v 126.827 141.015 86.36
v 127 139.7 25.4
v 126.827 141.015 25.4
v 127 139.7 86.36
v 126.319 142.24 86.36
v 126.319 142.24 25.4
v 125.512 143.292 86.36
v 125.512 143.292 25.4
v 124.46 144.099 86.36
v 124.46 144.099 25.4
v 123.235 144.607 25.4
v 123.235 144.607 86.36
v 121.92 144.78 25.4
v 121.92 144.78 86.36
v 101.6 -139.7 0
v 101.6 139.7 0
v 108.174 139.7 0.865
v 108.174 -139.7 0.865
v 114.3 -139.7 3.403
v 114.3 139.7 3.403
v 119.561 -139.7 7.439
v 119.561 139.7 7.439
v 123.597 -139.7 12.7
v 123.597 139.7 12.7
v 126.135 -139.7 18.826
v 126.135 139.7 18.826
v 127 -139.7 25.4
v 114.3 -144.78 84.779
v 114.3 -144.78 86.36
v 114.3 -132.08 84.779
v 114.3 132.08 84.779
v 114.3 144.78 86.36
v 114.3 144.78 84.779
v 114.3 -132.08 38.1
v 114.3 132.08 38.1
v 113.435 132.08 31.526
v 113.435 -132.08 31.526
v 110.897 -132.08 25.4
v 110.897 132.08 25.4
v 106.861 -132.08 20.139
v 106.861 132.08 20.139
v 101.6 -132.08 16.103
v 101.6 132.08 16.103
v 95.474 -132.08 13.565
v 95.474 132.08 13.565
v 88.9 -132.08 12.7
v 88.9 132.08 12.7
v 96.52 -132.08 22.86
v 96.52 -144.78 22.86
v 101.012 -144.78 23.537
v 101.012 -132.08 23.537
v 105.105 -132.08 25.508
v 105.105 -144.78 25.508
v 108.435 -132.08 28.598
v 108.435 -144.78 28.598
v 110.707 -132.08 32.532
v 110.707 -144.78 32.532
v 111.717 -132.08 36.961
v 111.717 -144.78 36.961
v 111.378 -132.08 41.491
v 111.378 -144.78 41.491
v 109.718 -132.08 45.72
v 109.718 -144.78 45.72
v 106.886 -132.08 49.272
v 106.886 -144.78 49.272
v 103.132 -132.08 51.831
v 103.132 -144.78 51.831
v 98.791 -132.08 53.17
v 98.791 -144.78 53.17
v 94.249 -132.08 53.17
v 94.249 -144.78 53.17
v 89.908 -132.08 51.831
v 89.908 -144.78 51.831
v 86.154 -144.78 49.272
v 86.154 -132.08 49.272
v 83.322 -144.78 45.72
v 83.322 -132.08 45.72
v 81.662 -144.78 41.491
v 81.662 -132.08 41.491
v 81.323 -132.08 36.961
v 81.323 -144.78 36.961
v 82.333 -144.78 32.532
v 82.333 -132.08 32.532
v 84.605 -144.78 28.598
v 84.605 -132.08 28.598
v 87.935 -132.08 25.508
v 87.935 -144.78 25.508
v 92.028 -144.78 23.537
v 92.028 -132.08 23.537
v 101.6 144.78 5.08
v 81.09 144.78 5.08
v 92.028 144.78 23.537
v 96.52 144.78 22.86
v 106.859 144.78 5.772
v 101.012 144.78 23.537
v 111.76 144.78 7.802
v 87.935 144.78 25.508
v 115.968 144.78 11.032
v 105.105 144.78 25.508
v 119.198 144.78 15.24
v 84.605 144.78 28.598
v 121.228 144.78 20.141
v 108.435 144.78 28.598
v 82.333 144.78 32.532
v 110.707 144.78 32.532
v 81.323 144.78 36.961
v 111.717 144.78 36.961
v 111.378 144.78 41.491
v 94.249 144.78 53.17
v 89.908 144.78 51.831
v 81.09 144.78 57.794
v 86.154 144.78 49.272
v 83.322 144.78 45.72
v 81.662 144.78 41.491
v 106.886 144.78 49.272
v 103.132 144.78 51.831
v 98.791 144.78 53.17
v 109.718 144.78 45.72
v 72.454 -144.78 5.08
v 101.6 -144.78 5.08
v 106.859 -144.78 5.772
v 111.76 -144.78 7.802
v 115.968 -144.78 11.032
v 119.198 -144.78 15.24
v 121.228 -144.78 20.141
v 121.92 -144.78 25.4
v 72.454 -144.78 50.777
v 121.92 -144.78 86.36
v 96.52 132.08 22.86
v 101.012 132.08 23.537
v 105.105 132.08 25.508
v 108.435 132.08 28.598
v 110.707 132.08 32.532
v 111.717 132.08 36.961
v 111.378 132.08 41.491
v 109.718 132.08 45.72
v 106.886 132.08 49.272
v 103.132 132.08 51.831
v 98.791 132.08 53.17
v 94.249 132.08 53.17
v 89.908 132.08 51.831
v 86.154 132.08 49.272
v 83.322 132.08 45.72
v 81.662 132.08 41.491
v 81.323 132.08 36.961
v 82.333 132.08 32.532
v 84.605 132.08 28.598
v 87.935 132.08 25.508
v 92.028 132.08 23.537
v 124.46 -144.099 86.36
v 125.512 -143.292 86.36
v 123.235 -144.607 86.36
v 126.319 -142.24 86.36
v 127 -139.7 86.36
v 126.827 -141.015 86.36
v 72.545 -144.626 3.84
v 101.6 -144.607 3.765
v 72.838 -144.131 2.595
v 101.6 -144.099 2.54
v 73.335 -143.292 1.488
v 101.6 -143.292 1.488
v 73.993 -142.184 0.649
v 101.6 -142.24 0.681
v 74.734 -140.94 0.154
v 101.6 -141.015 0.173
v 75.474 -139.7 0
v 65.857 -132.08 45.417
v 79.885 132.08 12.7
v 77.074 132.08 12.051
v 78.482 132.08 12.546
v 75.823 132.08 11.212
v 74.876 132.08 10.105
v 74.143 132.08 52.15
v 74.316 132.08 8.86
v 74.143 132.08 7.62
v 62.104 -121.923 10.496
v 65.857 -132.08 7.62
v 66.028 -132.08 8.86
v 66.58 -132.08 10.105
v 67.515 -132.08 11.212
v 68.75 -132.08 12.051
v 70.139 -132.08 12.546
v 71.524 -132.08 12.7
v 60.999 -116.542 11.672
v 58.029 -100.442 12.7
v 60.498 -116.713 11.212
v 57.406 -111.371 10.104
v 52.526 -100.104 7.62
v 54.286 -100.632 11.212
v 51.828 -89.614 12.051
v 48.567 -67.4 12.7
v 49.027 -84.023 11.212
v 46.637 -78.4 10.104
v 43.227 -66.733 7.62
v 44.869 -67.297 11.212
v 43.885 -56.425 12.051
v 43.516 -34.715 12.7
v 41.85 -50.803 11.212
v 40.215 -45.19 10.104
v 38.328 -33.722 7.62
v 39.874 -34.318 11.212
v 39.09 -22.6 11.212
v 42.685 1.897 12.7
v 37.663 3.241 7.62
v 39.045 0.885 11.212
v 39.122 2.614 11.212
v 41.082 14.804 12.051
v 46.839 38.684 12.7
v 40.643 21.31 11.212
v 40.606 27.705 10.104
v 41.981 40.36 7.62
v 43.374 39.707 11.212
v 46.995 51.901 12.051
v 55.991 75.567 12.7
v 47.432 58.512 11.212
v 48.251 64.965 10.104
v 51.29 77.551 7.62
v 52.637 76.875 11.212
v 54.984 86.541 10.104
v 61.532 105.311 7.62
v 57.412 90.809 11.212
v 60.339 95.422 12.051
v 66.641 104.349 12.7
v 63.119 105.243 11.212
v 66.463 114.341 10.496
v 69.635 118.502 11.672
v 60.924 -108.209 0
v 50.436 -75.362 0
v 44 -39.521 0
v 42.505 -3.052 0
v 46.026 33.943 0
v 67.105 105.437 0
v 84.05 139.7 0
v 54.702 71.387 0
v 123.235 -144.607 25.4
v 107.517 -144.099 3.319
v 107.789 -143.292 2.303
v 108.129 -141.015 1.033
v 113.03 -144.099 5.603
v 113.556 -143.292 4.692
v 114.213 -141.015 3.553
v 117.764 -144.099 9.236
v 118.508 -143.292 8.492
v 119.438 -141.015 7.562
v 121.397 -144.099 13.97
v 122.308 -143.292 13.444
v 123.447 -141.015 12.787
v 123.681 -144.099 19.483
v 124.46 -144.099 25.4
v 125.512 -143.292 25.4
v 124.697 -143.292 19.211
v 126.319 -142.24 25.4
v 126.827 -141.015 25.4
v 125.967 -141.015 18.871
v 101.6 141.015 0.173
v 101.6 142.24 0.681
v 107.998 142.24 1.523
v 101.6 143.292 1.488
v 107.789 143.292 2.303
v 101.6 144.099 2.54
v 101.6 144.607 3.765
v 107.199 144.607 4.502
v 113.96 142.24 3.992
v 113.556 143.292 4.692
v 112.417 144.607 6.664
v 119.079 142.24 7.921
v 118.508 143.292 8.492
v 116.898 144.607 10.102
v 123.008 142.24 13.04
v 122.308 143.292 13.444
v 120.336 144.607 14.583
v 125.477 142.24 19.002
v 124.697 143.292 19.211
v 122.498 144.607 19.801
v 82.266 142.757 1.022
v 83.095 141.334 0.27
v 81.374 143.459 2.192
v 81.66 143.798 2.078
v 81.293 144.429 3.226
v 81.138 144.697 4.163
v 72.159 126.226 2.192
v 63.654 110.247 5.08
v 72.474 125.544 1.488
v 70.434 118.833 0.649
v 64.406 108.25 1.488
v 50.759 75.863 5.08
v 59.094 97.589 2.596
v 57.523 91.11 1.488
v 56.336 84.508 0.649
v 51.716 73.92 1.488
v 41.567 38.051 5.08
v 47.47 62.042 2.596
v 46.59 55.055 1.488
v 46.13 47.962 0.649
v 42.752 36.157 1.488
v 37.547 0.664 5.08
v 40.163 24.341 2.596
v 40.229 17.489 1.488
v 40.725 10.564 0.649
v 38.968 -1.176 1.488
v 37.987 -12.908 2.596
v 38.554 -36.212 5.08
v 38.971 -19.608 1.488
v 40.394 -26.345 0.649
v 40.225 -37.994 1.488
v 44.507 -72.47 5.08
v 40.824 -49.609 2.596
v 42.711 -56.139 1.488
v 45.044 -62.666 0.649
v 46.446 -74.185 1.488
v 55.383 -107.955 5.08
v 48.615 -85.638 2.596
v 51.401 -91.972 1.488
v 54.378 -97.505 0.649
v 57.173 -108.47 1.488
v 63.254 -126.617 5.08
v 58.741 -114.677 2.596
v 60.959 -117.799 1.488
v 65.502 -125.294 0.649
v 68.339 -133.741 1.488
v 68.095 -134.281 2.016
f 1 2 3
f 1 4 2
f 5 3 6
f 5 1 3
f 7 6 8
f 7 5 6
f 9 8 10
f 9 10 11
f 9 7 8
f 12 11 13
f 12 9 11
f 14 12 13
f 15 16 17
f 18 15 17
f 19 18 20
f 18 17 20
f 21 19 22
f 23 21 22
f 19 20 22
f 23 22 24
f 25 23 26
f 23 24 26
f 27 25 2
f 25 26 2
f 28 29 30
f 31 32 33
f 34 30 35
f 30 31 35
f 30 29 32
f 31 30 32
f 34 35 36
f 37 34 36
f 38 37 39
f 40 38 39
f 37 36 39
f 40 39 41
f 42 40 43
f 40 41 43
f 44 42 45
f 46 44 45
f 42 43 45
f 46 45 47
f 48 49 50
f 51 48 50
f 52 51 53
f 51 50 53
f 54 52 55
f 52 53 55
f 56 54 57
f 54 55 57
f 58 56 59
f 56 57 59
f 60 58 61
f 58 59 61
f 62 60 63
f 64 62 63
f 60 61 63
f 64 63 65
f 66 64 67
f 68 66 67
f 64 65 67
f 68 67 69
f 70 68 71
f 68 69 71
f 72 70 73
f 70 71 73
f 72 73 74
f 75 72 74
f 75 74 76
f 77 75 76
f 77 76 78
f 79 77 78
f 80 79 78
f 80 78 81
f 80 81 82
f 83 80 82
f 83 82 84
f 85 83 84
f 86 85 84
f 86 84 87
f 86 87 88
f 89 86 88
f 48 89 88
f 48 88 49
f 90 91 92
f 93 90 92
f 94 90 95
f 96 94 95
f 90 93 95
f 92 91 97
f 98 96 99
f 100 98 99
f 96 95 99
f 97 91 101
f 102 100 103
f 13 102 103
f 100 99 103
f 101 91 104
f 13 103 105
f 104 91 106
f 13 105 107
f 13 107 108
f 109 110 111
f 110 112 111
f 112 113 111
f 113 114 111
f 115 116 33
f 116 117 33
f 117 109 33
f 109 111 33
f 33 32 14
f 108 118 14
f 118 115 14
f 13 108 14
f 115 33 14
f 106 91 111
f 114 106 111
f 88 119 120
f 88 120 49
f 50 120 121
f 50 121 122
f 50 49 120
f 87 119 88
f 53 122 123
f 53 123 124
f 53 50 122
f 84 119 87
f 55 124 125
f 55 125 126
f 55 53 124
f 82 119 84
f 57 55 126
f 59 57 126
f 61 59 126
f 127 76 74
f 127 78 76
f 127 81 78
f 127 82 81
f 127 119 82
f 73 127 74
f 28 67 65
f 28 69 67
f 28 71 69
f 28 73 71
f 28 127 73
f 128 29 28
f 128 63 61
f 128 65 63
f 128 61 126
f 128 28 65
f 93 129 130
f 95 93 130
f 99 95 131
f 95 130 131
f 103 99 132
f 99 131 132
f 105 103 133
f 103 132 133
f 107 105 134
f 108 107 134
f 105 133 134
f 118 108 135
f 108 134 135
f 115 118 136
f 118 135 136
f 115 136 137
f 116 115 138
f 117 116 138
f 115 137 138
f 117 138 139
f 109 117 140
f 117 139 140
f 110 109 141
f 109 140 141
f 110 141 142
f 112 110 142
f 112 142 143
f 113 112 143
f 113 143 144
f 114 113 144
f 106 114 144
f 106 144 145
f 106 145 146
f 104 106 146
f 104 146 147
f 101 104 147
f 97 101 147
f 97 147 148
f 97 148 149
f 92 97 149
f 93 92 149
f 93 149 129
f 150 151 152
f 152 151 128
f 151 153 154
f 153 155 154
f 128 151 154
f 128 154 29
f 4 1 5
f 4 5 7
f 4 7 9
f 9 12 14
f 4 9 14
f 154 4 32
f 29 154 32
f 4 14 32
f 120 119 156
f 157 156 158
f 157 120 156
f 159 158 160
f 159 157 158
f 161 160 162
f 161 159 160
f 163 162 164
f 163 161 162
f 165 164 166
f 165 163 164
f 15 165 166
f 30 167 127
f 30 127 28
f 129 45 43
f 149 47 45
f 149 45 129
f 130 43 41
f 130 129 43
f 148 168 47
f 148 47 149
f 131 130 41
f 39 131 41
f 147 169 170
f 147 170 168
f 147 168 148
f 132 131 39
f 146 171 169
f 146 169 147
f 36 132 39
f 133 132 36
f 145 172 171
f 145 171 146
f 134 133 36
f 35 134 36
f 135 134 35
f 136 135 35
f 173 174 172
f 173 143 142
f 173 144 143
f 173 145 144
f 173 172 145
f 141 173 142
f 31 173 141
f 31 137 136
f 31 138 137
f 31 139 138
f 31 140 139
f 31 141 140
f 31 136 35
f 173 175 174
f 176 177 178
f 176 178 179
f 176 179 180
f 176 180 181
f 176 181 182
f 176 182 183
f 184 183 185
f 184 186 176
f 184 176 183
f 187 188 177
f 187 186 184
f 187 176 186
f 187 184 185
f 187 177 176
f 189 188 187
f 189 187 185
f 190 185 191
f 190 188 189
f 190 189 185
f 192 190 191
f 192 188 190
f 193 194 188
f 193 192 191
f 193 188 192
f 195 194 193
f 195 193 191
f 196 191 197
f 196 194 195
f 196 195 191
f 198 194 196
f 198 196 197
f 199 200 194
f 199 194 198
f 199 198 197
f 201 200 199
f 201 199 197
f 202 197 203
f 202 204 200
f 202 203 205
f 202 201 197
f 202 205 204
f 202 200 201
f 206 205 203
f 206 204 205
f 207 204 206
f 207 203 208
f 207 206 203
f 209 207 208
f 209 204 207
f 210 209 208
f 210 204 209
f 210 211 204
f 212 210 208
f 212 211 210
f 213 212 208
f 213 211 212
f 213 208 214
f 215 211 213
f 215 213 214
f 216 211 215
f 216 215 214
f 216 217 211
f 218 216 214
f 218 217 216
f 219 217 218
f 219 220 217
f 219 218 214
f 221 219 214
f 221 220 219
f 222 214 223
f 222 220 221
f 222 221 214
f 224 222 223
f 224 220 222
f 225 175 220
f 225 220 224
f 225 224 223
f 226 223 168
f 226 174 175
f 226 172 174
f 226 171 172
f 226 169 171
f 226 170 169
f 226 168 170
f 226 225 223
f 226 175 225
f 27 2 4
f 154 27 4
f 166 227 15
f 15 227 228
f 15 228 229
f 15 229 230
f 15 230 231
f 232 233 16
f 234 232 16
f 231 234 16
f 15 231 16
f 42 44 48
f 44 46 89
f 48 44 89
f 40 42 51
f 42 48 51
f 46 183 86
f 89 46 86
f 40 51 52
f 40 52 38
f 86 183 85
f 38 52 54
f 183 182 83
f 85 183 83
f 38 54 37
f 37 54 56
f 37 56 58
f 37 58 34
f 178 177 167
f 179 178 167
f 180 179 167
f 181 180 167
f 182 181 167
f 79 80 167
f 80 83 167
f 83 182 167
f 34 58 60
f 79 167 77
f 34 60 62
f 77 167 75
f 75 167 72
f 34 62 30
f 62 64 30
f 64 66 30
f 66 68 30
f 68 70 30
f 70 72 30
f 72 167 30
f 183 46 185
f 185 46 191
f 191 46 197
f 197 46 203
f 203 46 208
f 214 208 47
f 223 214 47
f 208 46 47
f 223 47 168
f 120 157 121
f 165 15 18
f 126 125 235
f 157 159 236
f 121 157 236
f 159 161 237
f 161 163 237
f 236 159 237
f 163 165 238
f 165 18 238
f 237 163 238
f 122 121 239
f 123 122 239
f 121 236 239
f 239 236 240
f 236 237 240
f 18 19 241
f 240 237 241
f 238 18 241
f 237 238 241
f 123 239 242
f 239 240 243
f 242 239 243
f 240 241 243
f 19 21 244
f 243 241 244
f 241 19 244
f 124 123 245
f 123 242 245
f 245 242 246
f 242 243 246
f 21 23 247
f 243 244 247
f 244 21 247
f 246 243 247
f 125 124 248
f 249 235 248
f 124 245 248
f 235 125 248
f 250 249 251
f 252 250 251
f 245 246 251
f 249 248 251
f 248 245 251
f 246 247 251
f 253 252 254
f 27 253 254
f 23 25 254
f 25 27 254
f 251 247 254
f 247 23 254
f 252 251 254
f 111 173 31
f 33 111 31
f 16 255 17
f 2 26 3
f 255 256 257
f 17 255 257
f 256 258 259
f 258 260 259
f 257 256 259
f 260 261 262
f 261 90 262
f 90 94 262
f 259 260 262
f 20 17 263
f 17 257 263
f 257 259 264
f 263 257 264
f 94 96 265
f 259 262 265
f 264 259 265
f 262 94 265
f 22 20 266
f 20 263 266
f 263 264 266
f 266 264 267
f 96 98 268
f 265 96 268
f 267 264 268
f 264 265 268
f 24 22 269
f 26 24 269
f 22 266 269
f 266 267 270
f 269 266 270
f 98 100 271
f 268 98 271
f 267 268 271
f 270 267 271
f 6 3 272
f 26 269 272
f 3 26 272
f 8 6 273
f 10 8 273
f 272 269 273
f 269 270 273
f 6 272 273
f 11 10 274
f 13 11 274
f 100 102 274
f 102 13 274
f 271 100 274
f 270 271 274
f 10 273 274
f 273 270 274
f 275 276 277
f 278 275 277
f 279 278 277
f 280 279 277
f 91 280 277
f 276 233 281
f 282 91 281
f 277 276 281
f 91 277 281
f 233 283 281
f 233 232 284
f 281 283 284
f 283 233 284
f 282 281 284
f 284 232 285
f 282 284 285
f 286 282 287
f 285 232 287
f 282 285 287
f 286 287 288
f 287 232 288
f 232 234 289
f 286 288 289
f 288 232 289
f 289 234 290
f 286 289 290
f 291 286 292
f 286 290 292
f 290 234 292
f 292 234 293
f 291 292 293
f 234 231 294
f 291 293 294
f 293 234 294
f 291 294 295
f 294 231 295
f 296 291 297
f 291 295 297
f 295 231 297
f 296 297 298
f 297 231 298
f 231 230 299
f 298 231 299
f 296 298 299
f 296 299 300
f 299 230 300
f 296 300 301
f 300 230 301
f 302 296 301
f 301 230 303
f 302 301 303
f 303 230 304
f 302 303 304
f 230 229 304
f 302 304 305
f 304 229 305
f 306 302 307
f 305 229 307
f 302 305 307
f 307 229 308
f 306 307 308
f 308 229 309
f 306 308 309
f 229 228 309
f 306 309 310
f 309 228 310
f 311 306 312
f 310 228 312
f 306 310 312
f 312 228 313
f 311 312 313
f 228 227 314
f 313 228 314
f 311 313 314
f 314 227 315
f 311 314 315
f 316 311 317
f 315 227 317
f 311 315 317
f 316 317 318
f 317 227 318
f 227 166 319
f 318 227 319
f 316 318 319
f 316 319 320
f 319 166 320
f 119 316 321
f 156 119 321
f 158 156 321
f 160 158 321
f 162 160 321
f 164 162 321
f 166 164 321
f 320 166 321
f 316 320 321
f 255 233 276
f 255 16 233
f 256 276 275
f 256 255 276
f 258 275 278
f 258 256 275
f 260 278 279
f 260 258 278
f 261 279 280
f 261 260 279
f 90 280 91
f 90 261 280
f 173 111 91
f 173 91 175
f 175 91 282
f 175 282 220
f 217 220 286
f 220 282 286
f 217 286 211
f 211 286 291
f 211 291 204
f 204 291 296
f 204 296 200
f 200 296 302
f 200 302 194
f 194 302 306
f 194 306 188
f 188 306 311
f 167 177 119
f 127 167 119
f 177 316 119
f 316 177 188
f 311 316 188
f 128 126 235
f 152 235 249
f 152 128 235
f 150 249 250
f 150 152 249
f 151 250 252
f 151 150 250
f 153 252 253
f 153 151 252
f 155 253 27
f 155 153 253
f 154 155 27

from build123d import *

# Parameters (mm, degrees)
BOSS_EXTRUDE1_DEPTH = 144.78
RIB1_REACH          = 329.768
SKETCH3_WALL_W      = 771.836553366
SKETCH3_WALL_H      = 12.7
CUT_EXTRUDE1_DEPTH  = 289.56
FILLET1_R           = 5.08
SKETCH5_R           = 15.24
CUT_EXTRUDE2_DEPTH  = 328.768276772


with BuildPart() as part:
    # Sketch2 → Boss-Extrude1 (new, symmetric)
    with BuildSketch(Plane(origin=(0, 0, 0), x_dir=(1, 0, 0), z_dir=(0, 1, 0))):
        with BuildLine():
            Line((0, 0), (101.6, 0))
            ThreePointArc((101.6, 0), (119.560512242, -7.439487758), (127, -25.4))
            Line((127, -25.4), (127, -86.36))
            Line((127, -86.36), (114.3, -86.36))
            Line((114.3, -86.36), (114.3, -38.1))
            ThreePointArc((114.3, -38.1), (106.860512242, -20.139487758), (88.9, -12.7))
            Line((88.9, -12.7), (0, -12.7))
            Line((0, -12.7), (0, 0))
        make_face()
    extrude(amount=BOSS_EXTRUDE1_DEPTH, both=True)

    # Sketch3 wall → Rib1 (add, up to next)
    with BuildSketch(Plane(origin=(69.945945205, 144.78, 48.739427344), x_dir=(0.776098946536, 0, 0.630611152126), z_dir=(0.630611152126, 0, -0.776098946536)), mode=Mode.PRIVATE) as rib1_sk1:
        with Locations((0, 6.35)):
            Rectangle(SKETCH3_WALL_W, SKETCH3_WALL_H)
    rib1_tool1 = extrude(rib1_sk1.sketch, amount=RIB1_REACH, mode=Mode.PRIVATE) - part.part
    rib1 = rib1_tool1.solids().sort_by_distance((69.945945205, 144.78, 48.739427344))[0]
    add(rib1)

    # Mirror1: Rib1 across plane
    add(rib1.mirror(Plane.ZX))

    # Sketch4 → Cut-Extrude1 (cut)
    with BuildSketch(Plane(origin=(0, 0, 0), x_dir=(-1, 0, 0), z_dir=(0, 0, -1))):
        with BuildLine():
            Line((-81.089693515, 144.78), (0, 144.78))
            Line((0, 144.78), (0, -144.78))
            Line((0, -144.78), (-72.453889421, -144.78))
            add(Edge.make_bspline(
                [(-81.089693515, 144.78), (-22.496571769, 42.315365933), (-25.923555625, -60.216187191), (-72.453889421, -144.78)],
                knots=[0, 0, 0, 0, 1, 1, 1, 1], degree=3))
        make_face()
    extrude(amount=-CUT_EXTRUDE1_DEPTH, mode=Mode.SUBTRACT)

    # Fillet1
    fillet1_edges = [part.edges().sort_by_distance(p)[0] for p in [
        (127, 144.78, 55.88),
        (119.560512242, 144.78, 7.439487758),
        (91.344846758, 144.78, 0),
        (127, -144.78, 55.88),
        (119.560512242, -144.78, 7.439487758),
        (37.55873854, 0.944564154, 0),
        (87.02694471, -144.78, 0),
        (37.555382274, 0.862578583, 12.7),
    ]]
    fillet(fillet1_edges, radius=FILLET1_R)

    # Sketch5 → Cut-Extrude2 (cut, through all)
    with BuildSketch(Plane.XZ.offset(144.78)):
        with Locations(Location((96.52, 38.1, 0), (0, 0, 270))):
            Circle(SKETCH5_R)
    extrude(amount=-CUT_EXTRUDE2_DEPTH, mode=Mode.SUBTRACT)


solid = part.part
